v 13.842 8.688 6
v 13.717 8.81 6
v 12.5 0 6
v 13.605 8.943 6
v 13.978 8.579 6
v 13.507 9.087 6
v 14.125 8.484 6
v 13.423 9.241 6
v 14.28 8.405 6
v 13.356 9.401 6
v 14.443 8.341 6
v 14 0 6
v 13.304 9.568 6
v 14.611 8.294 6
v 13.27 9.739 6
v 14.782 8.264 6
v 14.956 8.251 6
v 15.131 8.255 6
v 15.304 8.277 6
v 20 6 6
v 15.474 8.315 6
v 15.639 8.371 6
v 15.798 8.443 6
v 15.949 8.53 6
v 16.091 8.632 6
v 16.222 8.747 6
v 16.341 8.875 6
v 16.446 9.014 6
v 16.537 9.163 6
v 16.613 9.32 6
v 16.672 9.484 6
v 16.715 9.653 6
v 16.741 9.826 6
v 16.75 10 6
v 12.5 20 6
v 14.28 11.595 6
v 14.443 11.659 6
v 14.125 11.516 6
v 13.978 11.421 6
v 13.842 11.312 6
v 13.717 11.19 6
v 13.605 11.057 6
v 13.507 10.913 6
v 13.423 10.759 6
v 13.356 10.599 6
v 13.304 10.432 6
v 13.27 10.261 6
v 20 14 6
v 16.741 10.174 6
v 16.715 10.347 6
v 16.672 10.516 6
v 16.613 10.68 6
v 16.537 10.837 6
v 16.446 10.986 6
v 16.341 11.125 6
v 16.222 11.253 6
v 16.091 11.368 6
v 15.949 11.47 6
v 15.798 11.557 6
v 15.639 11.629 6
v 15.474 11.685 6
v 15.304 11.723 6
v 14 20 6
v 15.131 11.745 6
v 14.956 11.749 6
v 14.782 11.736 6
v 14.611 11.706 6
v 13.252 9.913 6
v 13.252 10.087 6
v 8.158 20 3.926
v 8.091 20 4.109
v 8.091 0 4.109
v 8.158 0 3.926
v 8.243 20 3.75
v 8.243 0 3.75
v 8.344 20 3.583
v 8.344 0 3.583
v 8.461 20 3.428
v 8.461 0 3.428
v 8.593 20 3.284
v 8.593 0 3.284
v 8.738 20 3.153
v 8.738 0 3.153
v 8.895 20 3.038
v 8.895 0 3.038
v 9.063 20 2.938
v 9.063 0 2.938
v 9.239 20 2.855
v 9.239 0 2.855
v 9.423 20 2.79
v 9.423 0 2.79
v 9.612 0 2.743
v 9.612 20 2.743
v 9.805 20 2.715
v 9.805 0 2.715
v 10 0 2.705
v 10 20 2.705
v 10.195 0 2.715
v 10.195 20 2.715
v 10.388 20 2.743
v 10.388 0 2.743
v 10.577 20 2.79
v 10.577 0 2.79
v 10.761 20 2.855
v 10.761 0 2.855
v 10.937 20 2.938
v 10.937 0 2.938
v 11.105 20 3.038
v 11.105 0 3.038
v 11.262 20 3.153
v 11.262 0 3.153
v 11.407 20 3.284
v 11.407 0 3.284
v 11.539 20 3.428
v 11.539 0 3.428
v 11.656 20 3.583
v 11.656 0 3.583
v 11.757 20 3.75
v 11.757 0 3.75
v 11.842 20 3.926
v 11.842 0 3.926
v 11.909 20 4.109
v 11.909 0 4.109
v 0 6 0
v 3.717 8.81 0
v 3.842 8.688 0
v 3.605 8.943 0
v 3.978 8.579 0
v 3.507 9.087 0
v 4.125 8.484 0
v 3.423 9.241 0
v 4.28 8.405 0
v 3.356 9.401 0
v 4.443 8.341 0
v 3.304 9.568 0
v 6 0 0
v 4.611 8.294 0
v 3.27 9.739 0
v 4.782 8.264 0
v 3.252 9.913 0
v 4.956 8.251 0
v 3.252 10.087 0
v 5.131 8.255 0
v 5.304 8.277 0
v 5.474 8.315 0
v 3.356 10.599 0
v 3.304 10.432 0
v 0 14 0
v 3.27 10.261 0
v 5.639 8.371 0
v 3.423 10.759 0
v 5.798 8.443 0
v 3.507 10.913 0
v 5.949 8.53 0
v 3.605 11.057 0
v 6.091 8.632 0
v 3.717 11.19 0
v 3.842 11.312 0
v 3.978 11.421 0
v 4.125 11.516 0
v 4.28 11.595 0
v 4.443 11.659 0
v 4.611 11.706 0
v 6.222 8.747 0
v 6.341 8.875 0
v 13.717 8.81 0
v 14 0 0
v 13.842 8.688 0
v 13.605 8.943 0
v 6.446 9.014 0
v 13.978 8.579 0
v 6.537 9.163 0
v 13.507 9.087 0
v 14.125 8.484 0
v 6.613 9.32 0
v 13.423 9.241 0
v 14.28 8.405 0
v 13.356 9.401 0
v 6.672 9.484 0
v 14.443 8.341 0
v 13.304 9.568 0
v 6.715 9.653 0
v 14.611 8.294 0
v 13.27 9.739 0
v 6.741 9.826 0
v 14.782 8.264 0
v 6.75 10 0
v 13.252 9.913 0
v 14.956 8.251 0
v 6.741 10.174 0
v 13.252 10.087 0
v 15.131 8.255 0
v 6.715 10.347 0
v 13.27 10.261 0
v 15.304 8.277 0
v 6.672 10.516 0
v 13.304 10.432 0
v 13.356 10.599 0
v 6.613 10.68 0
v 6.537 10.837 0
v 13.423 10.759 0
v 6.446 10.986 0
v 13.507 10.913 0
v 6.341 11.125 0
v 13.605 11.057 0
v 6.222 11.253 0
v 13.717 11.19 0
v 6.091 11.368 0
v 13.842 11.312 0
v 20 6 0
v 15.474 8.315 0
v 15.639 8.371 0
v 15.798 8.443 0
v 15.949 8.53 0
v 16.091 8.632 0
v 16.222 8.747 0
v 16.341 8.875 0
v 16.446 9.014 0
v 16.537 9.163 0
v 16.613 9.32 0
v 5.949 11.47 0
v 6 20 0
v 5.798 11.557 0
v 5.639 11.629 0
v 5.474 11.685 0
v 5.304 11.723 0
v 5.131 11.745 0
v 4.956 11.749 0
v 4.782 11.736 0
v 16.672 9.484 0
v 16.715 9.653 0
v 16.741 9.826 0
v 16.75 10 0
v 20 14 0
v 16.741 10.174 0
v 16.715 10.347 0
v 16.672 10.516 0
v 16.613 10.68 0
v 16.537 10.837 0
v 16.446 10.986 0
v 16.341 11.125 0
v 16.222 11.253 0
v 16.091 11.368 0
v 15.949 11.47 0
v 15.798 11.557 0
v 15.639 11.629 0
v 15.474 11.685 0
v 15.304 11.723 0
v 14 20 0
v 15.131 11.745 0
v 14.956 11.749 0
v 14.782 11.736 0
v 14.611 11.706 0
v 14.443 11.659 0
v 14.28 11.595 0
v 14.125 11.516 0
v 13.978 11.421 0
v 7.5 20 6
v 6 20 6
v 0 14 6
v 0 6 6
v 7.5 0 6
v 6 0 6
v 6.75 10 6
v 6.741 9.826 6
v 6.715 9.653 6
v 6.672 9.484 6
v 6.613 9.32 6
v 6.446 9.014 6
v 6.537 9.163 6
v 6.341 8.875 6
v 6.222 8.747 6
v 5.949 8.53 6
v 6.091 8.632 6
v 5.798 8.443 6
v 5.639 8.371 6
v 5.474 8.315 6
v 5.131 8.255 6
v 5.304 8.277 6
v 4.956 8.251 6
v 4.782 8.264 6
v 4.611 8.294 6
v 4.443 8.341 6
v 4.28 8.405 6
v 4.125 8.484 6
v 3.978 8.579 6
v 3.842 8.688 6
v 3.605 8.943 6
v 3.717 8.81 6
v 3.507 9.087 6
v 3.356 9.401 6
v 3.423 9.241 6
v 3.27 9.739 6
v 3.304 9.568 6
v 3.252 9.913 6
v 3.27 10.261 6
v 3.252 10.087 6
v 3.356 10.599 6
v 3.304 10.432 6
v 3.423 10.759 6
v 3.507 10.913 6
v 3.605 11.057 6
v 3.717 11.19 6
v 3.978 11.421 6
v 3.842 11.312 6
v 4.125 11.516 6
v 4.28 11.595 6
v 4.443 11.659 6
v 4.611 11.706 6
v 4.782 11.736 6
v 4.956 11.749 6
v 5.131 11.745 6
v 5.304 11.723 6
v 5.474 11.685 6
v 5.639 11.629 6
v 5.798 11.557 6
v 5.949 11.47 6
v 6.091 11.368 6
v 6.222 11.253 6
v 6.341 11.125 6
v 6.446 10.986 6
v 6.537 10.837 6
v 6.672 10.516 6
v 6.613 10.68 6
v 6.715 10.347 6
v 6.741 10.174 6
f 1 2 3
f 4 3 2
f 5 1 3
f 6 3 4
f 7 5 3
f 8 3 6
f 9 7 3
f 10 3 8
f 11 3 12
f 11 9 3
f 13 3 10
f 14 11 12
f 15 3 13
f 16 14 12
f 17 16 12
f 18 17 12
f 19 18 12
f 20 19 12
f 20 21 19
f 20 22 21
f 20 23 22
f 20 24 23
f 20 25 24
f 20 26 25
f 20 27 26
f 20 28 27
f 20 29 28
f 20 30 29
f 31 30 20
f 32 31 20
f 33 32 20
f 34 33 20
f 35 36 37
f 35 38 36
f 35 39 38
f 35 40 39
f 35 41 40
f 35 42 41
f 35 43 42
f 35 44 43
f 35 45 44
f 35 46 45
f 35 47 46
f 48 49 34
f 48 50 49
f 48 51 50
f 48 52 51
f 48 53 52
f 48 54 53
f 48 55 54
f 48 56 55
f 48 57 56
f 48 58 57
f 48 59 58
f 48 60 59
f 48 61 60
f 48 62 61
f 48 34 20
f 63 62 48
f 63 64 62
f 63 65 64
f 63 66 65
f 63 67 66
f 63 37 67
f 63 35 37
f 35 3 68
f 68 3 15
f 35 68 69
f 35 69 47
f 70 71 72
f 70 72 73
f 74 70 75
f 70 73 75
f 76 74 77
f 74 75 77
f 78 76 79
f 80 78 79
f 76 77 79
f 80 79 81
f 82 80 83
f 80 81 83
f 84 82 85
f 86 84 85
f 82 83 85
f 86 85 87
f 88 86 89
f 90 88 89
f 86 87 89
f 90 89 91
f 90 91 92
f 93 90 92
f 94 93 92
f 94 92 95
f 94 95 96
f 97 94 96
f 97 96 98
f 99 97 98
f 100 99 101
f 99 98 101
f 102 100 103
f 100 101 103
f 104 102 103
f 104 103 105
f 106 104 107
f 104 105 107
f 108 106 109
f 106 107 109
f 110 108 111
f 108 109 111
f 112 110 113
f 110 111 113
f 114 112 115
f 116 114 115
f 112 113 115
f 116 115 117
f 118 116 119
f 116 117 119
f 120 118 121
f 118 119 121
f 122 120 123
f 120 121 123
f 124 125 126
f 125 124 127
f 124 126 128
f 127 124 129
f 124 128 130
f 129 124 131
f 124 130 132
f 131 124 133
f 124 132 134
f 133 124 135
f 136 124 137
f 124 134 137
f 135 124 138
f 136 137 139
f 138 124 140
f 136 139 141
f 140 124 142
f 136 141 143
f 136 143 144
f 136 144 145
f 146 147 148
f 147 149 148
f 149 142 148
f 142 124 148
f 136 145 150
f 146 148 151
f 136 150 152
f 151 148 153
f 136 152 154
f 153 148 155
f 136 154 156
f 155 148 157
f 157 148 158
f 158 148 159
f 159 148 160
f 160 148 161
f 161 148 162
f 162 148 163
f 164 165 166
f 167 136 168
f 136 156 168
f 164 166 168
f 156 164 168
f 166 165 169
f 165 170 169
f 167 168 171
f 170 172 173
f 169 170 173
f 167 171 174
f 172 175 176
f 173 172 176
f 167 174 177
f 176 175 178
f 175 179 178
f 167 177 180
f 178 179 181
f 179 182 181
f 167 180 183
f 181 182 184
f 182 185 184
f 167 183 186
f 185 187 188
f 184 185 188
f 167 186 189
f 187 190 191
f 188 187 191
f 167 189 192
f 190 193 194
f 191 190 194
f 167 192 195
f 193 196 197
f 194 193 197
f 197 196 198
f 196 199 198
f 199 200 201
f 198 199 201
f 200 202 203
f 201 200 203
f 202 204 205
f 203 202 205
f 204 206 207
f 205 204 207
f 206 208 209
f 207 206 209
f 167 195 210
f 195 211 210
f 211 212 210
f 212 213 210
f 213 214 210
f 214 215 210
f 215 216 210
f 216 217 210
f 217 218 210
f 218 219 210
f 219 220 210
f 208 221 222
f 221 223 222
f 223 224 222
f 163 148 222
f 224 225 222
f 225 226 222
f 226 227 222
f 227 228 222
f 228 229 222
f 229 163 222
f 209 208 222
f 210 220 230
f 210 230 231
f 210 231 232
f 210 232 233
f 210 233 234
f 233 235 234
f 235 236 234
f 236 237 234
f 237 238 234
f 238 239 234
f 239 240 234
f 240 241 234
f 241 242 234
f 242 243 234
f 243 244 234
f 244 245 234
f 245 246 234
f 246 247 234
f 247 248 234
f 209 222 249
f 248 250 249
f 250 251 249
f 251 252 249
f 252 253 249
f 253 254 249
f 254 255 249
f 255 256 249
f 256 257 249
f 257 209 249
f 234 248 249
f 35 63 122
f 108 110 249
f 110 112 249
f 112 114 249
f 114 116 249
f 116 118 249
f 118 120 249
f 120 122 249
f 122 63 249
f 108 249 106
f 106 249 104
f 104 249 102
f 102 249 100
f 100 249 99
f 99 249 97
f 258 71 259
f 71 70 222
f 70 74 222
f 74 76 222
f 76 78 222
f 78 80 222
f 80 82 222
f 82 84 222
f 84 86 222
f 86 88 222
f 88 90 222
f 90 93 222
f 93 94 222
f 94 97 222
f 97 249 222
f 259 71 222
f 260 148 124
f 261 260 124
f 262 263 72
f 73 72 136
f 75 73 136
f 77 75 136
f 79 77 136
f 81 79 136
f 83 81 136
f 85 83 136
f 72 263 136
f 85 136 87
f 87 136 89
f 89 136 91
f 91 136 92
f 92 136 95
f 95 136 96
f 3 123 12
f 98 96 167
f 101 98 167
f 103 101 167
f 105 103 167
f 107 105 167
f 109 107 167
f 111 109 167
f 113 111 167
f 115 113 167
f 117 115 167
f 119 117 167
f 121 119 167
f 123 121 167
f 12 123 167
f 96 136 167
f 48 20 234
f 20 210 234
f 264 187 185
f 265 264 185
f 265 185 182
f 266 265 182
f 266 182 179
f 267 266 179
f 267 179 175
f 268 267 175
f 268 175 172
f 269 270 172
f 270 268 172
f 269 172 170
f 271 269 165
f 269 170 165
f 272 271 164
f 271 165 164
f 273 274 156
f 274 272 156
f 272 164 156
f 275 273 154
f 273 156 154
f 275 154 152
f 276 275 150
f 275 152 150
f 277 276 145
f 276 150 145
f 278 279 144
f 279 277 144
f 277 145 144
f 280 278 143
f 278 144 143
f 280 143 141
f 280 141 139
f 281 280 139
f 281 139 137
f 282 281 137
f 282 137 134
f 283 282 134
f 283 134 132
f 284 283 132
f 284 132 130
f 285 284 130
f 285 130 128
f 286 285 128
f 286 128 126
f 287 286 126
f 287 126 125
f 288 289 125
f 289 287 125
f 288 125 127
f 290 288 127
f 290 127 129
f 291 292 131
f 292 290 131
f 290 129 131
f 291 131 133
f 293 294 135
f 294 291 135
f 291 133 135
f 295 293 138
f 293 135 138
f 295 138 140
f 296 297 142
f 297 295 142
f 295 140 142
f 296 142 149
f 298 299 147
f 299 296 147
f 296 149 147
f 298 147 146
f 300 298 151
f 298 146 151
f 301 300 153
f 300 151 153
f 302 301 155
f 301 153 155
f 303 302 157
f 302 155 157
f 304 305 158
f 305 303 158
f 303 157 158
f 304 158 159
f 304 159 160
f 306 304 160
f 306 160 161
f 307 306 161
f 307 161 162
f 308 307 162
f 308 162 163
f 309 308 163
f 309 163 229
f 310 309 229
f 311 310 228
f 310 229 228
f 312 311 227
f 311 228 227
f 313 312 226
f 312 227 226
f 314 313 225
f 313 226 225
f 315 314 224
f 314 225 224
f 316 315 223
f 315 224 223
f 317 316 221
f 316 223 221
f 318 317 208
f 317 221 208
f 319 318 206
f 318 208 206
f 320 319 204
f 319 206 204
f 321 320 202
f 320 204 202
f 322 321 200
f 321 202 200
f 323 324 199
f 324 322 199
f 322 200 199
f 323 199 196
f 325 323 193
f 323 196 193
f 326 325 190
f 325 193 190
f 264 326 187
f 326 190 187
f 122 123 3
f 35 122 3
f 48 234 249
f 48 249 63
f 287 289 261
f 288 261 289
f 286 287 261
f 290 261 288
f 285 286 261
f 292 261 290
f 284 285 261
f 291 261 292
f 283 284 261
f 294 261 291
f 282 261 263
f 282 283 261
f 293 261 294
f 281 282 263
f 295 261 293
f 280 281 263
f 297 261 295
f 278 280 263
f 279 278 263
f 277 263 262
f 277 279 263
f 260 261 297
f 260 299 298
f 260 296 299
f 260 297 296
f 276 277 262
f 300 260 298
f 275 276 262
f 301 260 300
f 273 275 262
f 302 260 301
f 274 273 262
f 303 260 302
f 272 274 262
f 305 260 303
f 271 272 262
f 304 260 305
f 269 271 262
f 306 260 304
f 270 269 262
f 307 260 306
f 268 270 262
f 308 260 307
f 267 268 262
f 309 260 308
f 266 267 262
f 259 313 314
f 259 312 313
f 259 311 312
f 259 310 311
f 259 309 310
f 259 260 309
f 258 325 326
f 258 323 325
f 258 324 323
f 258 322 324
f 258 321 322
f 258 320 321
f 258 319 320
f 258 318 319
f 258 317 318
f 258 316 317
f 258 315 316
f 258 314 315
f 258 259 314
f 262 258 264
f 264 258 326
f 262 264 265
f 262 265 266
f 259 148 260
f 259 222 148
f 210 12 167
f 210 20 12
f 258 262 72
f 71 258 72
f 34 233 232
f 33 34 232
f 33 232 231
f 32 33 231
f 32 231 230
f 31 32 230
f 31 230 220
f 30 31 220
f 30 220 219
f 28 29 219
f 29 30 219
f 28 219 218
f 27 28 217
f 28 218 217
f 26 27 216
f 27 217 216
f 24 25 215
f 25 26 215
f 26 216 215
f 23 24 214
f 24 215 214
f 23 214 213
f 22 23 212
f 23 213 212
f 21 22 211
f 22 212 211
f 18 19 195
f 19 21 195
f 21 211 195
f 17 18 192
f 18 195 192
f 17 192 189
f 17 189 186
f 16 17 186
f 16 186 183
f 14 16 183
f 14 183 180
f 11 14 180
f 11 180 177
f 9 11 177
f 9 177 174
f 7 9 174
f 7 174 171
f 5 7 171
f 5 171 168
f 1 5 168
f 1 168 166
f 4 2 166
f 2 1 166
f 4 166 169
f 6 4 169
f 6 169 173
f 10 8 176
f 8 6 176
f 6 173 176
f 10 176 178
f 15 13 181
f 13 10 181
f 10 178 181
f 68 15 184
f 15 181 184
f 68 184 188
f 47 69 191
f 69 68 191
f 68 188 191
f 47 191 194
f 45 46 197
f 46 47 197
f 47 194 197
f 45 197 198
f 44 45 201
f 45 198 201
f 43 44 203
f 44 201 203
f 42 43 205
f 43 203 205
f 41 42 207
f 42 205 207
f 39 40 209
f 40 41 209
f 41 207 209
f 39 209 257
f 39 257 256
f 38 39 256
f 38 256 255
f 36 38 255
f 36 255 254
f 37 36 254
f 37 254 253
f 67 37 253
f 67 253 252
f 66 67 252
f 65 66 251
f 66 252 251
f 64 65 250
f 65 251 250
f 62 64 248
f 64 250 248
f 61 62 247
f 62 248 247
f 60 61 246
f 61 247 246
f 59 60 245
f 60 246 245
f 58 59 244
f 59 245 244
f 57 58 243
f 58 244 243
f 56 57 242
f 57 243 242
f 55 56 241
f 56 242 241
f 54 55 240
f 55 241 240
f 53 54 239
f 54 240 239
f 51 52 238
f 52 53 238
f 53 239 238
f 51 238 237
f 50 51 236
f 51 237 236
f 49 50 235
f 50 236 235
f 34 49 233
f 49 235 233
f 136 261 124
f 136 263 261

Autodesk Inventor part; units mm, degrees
ref_plane "YZ Plane" through (0, 0, 0) normal (1, 0, 0) x (0, 1, 0)
ref_plane "XZ Plane" through (0, 0, 0) normal (0, 1, 0) x (-1, 0, 0)
ref_plane "XY Plane" through (0, 0, 0) normal (0, 0, 1) x (1, 0, 0)
sketch "スケッチ1" plane through (0, 0, 0) normal (0, 0, 1) x (1, 0, 0)
  line L0 (0, 0) -> (20, 0)
  line L1 (20, 0) -> (20, 20)
  line L2 (20, 20) -> (0, 20)
  line L3 (0, 20) -> (0, 0)
  line L4 (0, 10) -> (20, 10) construction
  circle A0 centre (5, 10) radius 1.75
  line L5 (10, 20) -> (10, 0) construction
  circle A1 centre (15, 10) radius 1.75
  dimension "d0" = 20
  dimension "d1" = 20
  dimension "d2" = 10
  dimension "d3" = 3.5
  dimension "d4" = 10
extrude "押し出し1" add sketch "スケッチ1" along normal blind 6
sketch "スケッチ2" plane through (0, 0, 0) normal (0, -1, 0) x (1, 0, 0)
  line L0 (0, 0) -> (20, 0) construction
  line L1 (10, 0) -> (10, 6) construction
  line L2 (0, 6) -> (20, 6) construction
  line L3 (7.5, 6) -> (8.091, 4.1087)
  line L4 (11.909, 4.1087) -> (12.5, 6)
  line L5 (7.5, 6) -> (12.5, 6)
  arc A0 (8.091, 4.1087) -> (11.909, 4.1087) centre (10, 4.7052) ccw
  point P0 (10, -2)
  dimension "d11" = 2
  dimension "d18" = 5
  dimension "d19" = 8
extrude "押し出し2" cut sketch "スケッチ2" against normal through all
chamfer "面取り1" distance 6 angle 45 4 edges at (20, 20, 3) (0, 20, 3) (20, 0, 3) (0, 0, 3)
properties part number "_3D プリント"
